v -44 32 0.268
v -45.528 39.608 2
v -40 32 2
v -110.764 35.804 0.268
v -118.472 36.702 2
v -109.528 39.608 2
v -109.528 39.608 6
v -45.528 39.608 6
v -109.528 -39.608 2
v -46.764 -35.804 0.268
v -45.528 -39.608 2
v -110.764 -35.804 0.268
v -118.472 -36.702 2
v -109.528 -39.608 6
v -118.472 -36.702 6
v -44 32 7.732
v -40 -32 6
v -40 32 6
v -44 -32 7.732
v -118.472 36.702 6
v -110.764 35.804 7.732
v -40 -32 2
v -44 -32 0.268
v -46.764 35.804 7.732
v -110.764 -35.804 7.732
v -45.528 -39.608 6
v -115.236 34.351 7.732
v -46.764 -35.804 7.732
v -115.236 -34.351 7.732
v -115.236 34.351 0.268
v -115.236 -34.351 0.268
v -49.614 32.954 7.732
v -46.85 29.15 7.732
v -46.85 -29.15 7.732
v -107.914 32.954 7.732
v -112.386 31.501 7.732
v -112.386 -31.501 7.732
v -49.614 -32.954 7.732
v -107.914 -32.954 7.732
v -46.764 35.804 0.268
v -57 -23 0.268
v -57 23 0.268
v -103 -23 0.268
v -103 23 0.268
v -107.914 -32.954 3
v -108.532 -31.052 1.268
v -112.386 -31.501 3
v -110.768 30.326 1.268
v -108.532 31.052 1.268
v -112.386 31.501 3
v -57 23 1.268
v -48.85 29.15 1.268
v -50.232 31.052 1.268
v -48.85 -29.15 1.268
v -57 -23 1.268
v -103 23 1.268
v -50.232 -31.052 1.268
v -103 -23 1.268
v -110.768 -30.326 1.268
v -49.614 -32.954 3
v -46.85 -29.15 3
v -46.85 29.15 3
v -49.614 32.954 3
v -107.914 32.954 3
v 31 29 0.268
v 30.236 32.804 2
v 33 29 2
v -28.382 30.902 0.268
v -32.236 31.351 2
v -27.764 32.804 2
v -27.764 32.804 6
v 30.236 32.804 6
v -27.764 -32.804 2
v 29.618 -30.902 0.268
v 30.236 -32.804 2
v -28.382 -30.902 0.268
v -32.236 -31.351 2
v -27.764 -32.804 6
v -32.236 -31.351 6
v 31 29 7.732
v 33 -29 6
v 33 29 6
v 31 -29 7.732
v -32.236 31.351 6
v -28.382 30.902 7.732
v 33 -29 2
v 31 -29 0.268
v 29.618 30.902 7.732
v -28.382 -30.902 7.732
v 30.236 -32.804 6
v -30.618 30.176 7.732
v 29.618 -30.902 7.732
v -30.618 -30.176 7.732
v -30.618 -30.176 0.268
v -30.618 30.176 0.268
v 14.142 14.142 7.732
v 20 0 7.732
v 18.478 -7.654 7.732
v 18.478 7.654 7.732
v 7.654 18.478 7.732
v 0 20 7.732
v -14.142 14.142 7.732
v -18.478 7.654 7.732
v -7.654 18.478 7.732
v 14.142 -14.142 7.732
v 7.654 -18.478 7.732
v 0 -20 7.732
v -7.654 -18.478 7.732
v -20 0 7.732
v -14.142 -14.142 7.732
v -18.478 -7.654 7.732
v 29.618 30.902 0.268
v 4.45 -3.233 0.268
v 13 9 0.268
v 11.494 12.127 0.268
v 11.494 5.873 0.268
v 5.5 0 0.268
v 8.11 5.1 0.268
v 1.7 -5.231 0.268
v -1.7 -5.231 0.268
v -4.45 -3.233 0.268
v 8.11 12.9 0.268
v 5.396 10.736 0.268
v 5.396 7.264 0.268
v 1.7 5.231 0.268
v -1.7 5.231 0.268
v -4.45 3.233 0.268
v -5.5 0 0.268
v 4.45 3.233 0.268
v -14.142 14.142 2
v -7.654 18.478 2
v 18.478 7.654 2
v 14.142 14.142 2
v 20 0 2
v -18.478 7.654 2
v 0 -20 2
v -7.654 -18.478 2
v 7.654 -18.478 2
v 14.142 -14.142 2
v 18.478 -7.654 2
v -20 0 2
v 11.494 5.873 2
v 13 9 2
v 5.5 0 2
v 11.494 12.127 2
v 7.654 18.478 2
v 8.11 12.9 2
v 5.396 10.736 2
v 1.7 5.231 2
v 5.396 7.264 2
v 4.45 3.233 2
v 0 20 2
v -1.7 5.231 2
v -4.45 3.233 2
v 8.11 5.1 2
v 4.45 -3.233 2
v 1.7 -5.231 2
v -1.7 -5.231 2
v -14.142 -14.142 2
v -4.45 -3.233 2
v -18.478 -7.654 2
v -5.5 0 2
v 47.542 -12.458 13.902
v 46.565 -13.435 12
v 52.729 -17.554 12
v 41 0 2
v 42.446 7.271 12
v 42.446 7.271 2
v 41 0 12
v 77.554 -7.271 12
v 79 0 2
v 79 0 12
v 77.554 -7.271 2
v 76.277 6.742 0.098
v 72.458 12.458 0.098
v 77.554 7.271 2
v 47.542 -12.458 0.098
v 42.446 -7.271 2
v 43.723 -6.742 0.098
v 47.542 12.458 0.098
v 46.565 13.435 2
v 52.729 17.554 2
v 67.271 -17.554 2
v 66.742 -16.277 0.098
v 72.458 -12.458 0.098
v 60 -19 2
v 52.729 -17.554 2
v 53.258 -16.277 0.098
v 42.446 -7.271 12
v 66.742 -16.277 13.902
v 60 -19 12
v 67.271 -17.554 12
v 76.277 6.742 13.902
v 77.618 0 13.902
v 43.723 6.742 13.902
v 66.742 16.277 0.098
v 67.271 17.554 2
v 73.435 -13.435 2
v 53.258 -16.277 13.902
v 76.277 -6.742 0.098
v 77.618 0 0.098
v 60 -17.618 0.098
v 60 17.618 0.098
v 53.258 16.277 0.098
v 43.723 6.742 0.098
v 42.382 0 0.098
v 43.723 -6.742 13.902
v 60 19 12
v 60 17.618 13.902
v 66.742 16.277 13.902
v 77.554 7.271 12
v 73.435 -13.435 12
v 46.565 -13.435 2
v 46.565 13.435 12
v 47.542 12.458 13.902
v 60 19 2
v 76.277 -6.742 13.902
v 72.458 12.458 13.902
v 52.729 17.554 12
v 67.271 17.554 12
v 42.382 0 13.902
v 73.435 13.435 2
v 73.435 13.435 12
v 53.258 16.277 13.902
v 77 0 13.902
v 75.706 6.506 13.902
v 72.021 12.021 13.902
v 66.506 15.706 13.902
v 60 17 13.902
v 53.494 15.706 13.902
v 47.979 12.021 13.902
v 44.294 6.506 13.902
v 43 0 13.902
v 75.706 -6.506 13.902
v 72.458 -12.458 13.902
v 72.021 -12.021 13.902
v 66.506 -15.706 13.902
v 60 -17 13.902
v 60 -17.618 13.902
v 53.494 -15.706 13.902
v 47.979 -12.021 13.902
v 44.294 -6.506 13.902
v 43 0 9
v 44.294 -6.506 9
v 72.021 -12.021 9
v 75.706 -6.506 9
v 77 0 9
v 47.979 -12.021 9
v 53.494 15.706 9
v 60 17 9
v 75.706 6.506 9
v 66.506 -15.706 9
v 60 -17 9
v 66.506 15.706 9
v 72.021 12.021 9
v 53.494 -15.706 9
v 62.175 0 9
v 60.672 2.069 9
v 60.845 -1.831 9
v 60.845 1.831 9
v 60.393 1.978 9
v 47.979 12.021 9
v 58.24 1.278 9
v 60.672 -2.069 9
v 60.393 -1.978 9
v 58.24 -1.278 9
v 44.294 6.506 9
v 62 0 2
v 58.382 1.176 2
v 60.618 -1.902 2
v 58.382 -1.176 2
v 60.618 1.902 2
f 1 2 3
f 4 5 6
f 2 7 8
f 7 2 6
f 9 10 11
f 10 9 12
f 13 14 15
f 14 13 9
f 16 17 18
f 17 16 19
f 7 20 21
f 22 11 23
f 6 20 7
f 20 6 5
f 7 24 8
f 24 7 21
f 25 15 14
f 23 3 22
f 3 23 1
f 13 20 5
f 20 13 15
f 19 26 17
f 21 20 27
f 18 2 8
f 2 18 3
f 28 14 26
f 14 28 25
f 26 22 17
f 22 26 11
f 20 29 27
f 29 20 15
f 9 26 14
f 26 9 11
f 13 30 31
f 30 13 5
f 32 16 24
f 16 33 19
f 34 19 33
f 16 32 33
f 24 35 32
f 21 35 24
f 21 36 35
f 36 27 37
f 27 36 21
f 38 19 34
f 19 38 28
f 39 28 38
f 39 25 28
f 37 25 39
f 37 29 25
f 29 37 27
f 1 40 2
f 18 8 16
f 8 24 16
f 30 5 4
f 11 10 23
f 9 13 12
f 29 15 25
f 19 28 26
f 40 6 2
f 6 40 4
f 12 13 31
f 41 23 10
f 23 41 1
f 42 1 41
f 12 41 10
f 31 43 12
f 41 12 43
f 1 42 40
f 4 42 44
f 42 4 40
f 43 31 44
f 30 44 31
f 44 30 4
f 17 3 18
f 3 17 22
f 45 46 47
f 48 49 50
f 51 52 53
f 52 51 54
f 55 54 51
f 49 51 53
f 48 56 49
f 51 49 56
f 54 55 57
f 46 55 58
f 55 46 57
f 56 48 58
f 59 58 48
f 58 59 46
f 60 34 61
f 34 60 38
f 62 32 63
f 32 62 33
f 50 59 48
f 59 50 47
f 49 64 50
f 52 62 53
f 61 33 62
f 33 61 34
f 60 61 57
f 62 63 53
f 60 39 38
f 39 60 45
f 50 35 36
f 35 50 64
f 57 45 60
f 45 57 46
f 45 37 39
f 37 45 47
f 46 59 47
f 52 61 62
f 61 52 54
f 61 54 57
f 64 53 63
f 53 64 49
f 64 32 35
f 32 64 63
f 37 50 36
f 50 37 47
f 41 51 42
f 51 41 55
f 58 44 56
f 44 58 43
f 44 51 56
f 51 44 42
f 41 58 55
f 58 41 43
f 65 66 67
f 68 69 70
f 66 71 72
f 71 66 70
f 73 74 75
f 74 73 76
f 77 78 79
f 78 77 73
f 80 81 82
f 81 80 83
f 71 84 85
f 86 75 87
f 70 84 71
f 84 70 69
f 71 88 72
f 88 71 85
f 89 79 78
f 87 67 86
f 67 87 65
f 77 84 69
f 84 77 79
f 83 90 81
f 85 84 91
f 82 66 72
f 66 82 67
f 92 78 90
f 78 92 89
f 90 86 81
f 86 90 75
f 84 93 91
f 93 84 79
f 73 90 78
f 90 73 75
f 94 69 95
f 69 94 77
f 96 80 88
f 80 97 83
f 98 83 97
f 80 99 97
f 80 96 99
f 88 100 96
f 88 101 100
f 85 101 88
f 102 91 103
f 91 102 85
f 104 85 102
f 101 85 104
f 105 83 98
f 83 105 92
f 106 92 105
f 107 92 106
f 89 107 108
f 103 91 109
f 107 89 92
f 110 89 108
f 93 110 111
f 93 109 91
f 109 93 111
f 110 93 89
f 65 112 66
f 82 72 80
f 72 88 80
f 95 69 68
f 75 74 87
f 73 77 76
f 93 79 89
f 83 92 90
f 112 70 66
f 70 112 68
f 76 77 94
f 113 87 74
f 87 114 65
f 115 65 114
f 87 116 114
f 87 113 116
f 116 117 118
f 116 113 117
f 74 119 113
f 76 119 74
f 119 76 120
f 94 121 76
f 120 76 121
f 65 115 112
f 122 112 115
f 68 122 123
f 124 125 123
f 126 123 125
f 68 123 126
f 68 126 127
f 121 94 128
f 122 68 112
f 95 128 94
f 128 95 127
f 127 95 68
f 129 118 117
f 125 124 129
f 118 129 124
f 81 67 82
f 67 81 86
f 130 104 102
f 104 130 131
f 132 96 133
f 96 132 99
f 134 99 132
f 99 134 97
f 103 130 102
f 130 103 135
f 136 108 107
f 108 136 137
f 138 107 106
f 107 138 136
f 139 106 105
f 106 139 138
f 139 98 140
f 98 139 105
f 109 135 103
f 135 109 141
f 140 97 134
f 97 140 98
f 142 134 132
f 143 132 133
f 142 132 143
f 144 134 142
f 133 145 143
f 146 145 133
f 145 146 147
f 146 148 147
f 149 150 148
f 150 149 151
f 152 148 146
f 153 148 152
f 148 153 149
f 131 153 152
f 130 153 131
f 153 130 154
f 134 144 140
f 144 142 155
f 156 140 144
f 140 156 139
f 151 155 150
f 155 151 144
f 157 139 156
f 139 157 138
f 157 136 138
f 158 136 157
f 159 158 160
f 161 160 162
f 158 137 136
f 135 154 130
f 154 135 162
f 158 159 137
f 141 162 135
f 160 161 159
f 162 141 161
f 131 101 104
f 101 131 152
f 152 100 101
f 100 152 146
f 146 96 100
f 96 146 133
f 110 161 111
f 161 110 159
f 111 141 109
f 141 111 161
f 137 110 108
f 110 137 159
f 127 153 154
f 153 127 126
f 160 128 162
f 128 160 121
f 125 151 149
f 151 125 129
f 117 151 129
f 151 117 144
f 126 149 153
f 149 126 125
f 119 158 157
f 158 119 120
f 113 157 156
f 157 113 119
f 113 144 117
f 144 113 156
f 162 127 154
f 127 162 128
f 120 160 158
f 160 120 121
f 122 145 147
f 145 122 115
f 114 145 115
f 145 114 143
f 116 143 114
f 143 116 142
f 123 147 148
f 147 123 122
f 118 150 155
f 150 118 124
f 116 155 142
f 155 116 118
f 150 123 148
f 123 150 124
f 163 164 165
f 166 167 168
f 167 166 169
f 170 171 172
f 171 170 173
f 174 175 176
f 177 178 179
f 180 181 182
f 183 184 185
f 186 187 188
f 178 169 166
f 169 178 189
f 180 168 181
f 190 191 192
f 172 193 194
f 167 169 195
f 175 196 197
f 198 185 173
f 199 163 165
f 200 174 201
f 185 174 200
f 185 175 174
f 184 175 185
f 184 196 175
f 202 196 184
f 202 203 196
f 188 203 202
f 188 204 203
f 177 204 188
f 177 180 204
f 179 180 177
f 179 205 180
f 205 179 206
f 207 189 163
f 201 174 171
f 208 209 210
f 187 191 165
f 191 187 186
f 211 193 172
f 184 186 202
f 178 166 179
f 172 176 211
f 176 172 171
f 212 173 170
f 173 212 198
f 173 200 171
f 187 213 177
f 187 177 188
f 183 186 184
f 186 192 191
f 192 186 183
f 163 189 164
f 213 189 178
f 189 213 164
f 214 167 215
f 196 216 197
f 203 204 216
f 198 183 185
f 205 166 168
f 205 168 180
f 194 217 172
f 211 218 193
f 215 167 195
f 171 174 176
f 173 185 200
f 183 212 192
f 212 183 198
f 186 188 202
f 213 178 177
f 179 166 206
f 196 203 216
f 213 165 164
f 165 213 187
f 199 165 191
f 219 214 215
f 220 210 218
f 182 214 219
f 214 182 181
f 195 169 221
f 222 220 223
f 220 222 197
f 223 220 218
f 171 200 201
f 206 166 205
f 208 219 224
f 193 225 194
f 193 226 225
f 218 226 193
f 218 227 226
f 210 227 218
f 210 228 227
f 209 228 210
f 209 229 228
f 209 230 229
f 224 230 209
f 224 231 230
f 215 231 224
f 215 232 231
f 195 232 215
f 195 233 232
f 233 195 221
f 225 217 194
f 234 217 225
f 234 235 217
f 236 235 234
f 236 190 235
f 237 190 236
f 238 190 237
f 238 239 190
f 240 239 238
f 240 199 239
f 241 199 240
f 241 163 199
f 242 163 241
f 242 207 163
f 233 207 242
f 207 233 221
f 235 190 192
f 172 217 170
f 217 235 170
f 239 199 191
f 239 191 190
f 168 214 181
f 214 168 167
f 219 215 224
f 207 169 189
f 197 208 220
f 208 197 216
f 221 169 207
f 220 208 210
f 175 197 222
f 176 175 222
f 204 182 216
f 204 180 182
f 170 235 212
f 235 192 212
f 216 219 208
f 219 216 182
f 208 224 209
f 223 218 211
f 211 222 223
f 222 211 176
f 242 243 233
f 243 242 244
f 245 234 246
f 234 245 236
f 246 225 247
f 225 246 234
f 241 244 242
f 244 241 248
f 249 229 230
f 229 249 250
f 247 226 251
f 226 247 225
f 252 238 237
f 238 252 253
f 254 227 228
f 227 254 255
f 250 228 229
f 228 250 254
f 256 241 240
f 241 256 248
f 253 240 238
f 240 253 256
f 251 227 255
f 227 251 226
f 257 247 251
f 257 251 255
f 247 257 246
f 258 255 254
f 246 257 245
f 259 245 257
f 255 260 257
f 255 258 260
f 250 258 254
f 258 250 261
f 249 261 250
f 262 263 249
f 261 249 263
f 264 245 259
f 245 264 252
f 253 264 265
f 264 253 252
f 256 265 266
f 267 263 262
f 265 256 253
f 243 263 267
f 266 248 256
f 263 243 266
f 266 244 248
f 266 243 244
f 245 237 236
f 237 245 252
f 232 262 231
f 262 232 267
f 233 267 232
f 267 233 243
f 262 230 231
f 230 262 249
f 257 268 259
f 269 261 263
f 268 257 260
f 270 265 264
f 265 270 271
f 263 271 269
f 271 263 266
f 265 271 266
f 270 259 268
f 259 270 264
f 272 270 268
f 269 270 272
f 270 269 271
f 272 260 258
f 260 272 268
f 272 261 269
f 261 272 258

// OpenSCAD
// Light Dimmer Switch Plate and Knob
// (c) 2013 Wouter Robers

Knob="yes";//[yes,no]
KnobDiameter=38;
KnopHoleDiameter=4;


Plate="yes";//[yes,no]
PlateSize=66;
PlateRoundEdge=4;
PlateHoleDiameter=11;
PlateThickness=8;

Rack="yes";//[yes,no]
RackSize=80;
RackRoundEdge=8;
RackThickness=PlateThickness;

Smoothness=8;// [8:Rough,30:Medium,60:Smooth]

$fa=180/Smoothness;
$fs=30/Smoothness;


if(Rack=="yes"){
translate([-RackSize,0,0])
difference(){
translate([0,0,RackThickness/2]) scale([RackRoundEdge/2,RackRoundEdge/2,1]) rcube([RackSize/(RackRoundEdge/2),RackSize/(RackRoundEdge/2),RackThickness],2);
translate([0,0,PlateThickness/2+2]) scale([PlateRoundEdge/2,PlateRoundEdge/2,1]) rcube([(PlateSize+0.3)/(PlateRoundEdge/2),(PlateSize+0.3)/(PlateRoundEdge/2),PlateThickness+2],2);
cube(PlateSize-20,center=true);
}
}


if(Plate=="yes"){
difference(){
translate([0,0,PlateThickness/2]) scale([PlateRoundEdge/2,PlateRoundEdge/2,1]) rcube([PlateSize/(PlateRoundEdge/2),PlateSize/(PlateRoundEdge/2),PlateThickness],2);
translate([0,0,2]) cylinder(r=KnobDiameter/2+1,h=PlateThickness);
translate([0,0,-2]) cylinder(r=PlateHoleDiameter/2,h=PlateThickness);
translate([9,9,-2]) cylinder(r=4,h=PlateThickness);
}
}

if(Knob=="yes"){
translate([60,0,14]) rotate([180,0,0])
difference(){
translate([0,0,7]) rcylinder(KnobDiameter/2,KnobDiameter/2,h=14);
translate([0,0,-1]) cylinder(r=KnobDiameter/2-2,h=6);
translate([0,0,4]) cylinder(r1=KnopHoleDiameter/2*1.1,r2=KnopHoleDiameter/2,h=8);
}
}


module rcube(Size=[20,20,20],b=2)
{hull(){for(x=[-(Size[0]/2-b),(Size[0]/2-b)]){for(y=[-(Size[1]/2-b),(Size[1]/2-b)]){for(z=[-(Size[2]/2-b),(Size[2]/2-b)]){ translate([x,y,z]) sphere(b);}}}}}


module rcylinder(r1=10,r2=10,h=10,b=2)
{translate([0,0,-h/2]) hull(){rotate_extrude() translate([r1-b,b,0]) circle(r = b); rotate_extrude() translate([r2-b, h-b, 0]) circle(r = b);}}
